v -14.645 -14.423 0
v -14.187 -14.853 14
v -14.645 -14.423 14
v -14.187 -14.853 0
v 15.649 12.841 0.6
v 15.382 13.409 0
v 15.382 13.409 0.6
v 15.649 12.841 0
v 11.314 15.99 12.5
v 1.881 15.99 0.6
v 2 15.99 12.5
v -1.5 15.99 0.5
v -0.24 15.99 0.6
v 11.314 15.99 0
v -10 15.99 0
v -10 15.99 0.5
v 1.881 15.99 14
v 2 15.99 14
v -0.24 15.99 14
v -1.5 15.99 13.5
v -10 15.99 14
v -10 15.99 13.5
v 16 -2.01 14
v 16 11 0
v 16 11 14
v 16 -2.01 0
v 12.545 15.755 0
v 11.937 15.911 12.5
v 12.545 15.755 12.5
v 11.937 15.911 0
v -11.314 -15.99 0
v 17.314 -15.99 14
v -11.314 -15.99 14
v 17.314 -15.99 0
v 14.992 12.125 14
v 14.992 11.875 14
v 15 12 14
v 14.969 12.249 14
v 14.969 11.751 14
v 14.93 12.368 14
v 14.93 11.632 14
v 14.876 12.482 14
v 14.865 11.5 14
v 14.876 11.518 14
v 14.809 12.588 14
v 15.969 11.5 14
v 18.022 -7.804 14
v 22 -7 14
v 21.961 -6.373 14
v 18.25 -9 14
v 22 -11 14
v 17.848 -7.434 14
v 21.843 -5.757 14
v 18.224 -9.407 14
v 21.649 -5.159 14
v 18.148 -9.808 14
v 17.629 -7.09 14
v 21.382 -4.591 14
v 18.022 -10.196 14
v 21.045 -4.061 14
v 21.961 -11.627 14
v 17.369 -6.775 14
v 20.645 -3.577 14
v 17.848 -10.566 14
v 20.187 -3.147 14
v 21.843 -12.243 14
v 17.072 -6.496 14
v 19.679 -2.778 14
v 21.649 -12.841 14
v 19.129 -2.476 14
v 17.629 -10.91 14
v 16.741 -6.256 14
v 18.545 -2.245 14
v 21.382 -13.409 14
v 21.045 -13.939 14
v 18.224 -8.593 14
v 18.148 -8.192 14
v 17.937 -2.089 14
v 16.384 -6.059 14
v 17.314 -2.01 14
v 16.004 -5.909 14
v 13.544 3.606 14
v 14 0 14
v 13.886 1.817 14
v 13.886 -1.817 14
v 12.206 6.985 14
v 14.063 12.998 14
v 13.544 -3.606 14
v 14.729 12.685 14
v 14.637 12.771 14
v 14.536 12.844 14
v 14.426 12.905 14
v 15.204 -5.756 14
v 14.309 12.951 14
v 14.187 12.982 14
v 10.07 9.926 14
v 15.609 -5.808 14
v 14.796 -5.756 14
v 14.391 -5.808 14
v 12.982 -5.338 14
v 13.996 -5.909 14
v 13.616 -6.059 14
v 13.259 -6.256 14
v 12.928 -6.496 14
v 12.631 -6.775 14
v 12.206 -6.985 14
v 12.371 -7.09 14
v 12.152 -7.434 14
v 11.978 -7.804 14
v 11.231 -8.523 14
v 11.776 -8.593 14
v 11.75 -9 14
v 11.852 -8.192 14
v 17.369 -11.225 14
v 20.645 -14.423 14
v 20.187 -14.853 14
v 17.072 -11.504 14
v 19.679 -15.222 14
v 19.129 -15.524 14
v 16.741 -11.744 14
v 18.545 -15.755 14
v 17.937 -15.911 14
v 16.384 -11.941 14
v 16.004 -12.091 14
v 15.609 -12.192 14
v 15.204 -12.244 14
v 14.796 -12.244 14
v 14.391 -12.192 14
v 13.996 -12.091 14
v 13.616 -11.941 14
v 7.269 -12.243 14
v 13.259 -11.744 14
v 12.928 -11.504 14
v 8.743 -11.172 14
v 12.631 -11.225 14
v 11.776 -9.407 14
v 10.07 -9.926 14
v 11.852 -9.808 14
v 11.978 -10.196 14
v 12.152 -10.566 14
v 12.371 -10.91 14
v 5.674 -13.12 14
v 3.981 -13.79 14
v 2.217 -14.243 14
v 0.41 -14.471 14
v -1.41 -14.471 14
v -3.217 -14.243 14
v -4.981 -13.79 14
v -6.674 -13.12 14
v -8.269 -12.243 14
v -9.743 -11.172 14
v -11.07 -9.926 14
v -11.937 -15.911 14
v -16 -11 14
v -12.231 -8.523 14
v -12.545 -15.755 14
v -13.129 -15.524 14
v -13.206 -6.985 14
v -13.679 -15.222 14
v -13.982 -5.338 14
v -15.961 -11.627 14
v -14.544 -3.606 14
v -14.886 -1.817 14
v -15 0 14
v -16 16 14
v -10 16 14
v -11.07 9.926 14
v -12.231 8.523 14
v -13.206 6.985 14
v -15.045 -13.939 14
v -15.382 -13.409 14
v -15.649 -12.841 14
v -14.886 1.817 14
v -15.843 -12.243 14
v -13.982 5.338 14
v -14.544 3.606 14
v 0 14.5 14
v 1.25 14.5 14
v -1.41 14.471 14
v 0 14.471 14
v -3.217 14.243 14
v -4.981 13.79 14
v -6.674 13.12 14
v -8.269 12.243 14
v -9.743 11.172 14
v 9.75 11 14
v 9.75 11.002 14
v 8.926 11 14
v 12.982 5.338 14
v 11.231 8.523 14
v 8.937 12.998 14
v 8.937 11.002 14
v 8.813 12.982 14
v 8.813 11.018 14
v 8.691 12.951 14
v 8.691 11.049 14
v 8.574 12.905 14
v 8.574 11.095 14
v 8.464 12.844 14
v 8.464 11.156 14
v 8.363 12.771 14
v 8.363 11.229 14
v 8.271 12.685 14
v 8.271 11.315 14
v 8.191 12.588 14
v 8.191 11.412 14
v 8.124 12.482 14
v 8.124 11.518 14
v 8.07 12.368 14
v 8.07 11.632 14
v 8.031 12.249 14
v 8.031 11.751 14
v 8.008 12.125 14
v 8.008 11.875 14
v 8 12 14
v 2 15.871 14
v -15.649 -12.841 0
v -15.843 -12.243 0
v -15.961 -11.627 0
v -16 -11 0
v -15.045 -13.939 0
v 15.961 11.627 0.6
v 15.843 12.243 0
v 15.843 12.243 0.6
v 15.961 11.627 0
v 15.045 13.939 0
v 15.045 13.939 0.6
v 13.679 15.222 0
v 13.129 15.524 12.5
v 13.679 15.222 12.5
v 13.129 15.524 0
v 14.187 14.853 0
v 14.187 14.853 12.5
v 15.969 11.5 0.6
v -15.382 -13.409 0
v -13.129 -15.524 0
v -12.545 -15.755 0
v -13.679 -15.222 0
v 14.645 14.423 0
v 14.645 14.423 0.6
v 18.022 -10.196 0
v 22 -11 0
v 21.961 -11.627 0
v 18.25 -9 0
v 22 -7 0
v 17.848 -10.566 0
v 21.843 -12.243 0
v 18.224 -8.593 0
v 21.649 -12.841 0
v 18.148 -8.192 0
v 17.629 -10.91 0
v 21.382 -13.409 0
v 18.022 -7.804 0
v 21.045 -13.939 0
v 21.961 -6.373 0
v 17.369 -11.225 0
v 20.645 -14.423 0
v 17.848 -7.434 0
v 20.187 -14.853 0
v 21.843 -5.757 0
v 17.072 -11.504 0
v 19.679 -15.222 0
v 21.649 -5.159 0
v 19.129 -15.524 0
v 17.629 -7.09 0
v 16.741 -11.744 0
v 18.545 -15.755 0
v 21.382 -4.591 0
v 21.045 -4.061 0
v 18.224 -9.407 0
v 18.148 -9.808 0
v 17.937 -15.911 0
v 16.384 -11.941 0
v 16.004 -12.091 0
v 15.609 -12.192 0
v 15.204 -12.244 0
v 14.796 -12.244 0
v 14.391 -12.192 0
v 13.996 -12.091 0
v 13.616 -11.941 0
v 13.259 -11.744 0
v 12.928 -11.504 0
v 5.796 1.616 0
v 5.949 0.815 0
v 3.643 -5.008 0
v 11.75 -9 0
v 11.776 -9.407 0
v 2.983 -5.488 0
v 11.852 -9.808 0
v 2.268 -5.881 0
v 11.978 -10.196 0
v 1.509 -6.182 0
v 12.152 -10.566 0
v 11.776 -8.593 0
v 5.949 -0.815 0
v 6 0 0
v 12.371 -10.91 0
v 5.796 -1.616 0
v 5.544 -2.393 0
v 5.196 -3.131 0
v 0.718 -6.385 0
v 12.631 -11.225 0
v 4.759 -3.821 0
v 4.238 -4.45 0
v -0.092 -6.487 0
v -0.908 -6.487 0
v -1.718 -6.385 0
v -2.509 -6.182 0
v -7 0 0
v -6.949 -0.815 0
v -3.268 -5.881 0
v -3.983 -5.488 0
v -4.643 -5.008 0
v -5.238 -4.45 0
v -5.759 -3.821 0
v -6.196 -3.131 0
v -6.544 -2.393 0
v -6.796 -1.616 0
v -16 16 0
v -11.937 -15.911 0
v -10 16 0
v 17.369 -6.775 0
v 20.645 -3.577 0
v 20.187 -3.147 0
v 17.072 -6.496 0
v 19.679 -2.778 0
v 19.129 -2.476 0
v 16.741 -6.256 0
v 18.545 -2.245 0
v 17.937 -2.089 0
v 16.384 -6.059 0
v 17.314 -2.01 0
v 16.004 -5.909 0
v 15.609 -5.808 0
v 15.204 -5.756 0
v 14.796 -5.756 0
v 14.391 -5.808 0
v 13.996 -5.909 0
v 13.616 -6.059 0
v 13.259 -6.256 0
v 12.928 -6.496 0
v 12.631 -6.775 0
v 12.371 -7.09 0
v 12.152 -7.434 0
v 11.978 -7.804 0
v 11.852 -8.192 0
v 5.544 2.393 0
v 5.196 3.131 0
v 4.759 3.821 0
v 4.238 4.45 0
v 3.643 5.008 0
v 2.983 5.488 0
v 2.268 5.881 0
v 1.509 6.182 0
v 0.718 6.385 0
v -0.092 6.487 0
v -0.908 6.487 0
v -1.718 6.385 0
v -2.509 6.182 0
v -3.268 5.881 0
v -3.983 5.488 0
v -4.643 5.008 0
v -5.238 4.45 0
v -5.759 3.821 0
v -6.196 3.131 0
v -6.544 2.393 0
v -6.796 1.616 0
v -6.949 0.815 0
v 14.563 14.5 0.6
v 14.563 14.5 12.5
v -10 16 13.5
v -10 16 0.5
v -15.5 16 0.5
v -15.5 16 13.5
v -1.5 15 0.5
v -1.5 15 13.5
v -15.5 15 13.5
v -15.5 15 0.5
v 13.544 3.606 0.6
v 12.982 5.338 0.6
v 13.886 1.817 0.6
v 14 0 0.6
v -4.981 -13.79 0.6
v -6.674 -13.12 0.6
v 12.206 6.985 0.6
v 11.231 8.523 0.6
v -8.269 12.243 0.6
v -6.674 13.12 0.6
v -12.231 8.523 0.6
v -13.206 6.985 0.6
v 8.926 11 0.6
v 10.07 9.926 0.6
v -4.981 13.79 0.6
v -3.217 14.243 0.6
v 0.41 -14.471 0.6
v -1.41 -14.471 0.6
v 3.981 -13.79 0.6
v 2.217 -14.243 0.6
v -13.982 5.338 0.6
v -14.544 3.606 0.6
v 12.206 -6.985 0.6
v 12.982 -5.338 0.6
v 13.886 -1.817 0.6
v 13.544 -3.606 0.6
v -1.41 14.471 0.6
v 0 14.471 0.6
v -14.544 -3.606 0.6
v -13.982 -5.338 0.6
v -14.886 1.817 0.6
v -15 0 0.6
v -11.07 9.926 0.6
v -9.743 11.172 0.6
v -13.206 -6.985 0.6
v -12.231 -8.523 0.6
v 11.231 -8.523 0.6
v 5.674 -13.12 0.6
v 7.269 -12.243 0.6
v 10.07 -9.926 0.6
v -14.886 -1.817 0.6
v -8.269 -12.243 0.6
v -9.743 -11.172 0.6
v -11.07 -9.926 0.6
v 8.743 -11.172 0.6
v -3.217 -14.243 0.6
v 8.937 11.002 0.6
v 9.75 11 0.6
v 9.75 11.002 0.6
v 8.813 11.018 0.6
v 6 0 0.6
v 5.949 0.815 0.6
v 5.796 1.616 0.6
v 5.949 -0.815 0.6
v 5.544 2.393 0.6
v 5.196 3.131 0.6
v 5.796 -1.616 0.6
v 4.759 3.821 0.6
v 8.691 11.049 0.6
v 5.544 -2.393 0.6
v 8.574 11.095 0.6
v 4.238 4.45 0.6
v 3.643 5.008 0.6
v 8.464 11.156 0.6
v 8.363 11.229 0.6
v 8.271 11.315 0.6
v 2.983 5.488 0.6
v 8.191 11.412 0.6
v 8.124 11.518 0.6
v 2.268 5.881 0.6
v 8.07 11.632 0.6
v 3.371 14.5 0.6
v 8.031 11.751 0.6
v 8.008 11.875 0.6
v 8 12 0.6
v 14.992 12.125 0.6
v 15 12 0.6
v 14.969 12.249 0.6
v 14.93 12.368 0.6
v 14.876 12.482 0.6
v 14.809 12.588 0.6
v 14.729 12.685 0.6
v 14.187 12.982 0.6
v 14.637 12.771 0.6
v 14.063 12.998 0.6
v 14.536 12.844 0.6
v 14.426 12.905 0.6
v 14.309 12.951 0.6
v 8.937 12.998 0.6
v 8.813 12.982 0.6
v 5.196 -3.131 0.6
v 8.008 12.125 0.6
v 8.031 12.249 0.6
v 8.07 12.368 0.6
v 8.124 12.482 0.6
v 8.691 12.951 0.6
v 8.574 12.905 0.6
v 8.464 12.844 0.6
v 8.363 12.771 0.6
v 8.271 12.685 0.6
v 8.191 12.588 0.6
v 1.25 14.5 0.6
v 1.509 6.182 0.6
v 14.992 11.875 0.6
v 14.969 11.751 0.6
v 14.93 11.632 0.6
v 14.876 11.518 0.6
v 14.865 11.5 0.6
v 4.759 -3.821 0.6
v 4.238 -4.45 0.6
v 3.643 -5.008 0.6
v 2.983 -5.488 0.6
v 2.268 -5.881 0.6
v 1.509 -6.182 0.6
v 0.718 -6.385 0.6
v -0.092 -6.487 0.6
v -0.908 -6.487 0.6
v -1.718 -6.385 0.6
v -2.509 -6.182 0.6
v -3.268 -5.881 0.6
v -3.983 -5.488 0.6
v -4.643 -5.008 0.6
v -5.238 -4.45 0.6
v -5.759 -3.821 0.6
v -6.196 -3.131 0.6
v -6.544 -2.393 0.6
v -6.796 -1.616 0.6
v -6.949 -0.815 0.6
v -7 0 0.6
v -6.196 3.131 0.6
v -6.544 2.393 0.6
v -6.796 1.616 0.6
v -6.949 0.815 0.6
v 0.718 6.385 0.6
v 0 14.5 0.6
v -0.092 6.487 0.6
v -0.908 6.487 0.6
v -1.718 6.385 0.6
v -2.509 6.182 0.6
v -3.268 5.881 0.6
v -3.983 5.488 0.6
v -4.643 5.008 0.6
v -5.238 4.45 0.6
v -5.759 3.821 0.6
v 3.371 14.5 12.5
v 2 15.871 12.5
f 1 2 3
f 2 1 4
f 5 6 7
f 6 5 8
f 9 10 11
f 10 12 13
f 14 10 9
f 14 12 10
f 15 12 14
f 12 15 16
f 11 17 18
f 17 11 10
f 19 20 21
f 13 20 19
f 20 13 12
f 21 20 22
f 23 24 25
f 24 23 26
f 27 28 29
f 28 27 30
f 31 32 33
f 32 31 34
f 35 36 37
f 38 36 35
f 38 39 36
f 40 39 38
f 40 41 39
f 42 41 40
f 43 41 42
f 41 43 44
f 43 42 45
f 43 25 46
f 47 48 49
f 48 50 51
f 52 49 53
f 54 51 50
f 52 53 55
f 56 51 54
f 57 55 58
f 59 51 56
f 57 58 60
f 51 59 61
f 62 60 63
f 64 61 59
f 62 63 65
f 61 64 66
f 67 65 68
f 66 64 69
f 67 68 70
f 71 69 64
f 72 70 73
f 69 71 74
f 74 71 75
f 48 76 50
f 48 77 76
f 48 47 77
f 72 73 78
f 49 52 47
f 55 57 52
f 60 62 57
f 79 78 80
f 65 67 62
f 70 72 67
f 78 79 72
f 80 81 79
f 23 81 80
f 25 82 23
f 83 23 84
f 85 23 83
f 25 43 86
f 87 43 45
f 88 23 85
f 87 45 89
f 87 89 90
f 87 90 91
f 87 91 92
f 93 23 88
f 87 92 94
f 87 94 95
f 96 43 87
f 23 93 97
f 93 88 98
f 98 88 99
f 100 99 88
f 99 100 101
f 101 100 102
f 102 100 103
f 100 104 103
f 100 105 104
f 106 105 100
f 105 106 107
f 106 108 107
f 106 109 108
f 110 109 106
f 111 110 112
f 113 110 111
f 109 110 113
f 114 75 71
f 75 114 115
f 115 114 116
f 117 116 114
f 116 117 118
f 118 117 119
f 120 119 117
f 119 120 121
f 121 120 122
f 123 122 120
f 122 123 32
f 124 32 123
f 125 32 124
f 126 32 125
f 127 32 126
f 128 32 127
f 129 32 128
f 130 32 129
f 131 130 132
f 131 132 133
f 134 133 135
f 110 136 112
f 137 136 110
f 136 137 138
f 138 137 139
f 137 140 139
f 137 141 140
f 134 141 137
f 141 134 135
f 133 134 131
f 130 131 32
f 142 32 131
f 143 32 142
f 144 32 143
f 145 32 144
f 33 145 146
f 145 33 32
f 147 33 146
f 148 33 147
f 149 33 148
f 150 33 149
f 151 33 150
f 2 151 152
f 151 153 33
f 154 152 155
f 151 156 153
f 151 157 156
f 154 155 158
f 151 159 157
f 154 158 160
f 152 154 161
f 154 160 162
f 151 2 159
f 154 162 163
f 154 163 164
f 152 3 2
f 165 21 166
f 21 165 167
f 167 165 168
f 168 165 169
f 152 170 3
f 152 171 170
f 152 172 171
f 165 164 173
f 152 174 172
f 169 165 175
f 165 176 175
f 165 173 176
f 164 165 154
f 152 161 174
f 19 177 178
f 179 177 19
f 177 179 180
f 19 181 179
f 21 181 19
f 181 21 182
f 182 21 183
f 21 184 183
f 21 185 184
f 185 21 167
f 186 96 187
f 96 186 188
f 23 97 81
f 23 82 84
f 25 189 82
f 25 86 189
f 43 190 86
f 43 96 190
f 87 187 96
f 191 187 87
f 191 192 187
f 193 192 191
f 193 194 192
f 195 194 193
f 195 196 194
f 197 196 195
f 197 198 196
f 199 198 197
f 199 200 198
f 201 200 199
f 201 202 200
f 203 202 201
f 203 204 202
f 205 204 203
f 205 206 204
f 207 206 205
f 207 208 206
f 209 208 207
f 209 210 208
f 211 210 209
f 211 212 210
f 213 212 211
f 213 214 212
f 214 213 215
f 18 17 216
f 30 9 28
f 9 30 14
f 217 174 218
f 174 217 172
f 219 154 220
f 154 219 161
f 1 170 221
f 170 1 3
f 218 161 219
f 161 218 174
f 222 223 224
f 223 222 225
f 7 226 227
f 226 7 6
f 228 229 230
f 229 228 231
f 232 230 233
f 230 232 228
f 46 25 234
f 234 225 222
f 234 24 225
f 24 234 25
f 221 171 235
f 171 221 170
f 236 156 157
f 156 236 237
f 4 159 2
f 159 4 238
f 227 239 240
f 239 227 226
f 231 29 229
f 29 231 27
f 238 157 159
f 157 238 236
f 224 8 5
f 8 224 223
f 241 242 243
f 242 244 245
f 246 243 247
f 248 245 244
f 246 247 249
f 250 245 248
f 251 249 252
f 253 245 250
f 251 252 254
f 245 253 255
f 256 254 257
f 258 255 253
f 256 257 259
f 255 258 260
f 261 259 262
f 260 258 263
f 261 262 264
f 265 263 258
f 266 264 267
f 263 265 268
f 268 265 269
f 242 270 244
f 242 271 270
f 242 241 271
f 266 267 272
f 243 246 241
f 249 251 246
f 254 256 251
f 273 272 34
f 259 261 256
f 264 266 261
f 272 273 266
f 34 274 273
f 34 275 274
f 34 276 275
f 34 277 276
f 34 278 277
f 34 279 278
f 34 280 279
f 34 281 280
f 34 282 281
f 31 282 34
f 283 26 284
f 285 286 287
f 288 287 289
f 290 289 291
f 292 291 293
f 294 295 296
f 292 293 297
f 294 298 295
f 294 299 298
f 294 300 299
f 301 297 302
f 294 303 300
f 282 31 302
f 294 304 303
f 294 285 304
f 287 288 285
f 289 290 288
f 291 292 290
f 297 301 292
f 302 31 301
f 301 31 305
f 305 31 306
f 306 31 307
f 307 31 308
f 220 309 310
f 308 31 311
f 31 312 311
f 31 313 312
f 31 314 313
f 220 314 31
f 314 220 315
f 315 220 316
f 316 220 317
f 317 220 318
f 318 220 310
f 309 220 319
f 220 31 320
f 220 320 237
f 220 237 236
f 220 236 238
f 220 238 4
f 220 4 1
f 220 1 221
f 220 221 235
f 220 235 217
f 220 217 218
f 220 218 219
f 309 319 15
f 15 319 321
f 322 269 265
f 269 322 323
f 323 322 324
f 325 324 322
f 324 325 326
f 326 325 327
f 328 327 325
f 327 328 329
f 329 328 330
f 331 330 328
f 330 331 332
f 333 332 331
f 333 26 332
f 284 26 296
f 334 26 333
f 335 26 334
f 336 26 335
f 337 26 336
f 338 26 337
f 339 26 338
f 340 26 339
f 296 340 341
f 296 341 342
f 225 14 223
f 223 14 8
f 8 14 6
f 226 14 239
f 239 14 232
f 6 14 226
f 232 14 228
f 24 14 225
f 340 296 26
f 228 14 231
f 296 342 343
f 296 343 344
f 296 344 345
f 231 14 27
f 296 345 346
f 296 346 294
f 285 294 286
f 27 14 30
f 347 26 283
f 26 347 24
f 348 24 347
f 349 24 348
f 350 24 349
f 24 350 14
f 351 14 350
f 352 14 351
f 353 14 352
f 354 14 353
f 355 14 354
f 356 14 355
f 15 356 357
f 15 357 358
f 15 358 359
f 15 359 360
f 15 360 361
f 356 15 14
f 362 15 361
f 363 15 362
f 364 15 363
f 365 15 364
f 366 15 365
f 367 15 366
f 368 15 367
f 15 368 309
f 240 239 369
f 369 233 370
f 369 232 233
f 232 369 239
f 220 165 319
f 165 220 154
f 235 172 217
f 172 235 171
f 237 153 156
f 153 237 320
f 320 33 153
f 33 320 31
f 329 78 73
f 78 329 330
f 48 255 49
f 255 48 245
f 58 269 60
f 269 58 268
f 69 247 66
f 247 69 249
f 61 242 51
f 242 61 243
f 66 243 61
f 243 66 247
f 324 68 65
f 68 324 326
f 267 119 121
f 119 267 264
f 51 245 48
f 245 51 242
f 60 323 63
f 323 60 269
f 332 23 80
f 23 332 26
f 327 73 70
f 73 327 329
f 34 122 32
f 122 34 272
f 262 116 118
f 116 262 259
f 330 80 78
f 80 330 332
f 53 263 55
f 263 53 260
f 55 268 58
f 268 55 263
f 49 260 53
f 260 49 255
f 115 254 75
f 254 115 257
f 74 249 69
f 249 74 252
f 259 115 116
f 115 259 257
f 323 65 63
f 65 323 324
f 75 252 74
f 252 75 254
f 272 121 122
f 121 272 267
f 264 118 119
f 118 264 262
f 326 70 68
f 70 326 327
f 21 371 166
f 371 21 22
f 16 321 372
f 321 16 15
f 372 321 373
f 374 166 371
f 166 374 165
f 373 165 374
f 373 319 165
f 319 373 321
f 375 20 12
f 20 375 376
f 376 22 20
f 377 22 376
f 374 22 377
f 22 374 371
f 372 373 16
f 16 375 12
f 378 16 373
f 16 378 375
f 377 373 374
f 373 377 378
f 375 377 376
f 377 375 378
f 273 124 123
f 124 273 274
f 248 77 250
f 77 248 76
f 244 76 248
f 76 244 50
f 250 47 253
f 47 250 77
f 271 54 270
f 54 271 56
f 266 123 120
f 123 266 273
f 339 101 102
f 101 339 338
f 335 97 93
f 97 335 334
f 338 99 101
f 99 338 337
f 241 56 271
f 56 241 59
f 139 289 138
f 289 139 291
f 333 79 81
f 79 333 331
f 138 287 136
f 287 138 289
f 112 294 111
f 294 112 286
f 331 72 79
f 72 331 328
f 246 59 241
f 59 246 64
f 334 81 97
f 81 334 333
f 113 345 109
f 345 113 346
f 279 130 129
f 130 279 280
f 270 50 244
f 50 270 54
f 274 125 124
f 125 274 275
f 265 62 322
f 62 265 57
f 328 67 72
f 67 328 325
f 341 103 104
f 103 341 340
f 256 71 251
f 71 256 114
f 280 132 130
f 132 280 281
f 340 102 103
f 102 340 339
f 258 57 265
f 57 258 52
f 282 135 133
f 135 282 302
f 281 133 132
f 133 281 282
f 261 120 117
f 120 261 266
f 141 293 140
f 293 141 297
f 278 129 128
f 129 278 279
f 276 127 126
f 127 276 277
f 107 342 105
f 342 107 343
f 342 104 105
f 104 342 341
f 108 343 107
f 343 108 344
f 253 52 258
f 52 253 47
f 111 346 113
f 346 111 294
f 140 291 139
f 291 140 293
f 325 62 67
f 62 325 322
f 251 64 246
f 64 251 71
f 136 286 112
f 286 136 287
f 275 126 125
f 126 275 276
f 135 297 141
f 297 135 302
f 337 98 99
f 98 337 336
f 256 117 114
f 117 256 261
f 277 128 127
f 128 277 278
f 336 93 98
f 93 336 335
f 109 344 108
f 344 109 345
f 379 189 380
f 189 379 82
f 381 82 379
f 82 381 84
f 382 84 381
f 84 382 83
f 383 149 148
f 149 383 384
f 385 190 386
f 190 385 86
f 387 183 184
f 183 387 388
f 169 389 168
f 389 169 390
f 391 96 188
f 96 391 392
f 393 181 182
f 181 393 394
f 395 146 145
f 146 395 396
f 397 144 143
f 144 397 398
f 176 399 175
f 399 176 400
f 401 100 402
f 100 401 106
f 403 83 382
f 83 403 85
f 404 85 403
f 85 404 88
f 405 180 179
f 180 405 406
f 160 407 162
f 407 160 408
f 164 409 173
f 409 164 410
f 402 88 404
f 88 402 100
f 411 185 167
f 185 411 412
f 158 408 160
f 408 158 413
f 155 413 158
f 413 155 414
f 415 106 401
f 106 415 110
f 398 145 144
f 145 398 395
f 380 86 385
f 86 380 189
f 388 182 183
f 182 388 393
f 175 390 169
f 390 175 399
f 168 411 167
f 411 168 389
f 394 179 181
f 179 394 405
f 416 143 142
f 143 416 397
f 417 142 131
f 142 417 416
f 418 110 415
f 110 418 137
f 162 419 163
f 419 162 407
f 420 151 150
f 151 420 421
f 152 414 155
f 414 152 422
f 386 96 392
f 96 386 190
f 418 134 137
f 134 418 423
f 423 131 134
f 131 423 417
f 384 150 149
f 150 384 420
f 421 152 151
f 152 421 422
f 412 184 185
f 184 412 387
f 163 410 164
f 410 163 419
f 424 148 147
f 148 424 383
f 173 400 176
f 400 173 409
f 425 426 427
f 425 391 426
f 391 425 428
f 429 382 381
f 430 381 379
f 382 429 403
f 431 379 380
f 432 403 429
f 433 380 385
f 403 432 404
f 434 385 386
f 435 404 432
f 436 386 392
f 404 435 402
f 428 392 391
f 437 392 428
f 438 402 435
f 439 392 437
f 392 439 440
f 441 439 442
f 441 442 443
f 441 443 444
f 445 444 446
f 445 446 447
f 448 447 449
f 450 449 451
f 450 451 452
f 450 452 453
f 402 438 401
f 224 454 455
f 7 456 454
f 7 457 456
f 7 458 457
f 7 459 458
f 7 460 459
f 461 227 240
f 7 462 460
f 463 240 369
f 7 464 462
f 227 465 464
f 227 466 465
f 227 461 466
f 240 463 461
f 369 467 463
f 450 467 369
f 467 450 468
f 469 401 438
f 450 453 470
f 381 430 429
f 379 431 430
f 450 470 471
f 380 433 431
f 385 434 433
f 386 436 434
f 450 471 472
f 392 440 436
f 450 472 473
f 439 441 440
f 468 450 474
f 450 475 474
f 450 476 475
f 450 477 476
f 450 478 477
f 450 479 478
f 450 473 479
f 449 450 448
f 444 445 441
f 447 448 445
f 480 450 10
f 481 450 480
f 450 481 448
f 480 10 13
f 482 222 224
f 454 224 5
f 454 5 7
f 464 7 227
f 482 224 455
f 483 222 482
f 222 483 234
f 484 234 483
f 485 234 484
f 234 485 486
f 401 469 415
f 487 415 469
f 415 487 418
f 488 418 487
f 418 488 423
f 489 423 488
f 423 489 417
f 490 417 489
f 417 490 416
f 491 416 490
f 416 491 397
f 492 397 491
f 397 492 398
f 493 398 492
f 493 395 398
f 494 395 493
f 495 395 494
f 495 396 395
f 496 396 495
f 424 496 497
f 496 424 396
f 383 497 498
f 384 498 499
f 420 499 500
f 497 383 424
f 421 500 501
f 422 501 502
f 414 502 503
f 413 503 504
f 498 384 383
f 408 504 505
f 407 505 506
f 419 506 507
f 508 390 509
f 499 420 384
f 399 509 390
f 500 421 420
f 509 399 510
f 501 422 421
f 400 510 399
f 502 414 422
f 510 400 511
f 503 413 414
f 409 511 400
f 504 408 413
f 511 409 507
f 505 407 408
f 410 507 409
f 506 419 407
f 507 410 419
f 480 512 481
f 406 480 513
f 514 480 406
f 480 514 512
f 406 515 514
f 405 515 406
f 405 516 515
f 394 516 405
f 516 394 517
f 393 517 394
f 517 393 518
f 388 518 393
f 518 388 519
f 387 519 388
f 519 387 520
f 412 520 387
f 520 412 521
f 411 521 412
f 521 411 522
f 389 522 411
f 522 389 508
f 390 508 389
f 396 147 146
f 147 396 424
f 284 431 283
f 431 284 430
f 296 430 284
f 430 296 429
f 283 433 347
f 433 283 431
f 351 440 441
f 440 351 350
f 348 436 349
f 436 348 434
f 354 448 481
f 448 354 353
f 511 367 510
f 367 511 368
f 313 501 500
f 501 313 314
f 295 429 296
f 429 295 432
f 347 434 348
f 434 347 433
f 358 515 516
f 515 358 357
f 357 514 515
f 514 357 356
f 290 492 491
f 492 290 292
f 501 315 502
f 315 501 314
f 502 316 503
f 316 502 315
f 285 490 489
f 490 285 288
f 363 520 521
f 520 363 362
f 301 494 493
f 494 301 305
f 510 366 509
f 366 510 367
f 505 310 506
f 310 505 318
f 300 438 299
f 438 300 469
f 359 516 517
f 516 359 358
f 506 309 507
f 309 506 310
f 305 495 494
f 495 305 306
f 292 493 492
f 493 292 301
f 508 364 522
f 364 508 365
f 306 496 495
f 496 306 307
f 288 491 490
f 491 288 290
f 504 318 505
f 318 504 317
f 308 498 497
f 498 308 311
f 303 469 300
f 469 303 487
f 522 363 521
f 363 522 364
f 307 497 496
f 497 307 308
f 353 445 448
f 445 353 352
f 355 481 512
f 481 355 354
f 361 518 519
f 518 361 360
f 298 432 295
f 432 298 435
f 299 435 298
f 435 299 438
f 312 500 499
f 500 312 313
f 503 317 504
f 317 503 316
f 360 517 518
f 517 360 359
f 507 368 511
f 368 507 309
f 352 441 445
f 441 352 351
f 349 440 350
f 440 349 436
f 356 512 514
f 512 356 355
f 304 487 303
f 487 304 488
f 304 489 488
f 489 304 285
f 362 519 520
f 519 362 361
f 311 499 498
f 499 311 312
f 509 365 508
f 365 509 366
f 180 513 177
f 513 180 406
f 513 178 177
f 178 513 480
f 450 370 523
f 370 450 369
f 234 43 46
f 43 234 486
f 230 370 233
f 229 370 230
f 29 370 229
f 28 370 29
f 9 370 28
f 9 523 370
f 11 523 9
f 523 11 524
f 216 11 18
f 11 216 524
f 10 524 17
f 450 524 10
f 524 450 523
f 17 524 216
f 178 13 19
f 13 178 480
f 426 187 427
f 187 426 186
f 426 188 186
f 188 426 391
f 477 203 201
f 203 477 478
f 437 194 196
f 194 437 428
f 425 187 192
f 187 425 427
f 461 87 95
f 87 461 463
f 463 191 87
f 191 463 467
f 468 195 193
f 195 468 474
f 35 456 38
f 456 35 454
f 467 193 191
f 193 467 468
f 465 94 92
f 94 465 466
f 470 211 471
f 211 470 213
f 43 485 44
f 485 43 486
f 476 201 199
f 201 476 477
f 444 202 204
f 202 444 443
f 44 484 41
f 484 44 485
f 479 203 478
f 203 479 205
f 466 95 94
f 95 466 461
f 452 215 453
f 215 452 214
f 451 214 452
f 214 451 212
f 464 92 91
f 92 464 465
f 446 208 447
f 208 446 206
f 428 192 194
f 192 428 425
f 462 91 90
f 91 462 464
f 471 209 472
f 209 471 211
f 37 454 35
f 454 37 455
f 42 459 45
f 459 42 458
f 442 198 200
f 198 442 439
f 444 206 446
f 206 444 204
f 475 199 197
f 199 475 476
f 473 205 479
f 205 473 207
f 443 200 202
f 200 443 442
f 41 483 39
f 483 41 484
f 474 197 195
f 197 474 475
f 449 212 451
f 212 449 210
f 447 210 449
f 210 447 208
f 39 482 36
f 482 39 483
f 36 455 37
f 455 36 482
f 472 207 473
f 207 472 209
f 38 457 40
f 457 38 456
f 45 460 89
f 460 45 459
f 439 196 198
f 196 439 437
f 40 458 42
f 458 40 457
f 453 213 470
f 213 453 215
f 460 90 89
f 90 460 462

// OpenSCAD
$fn = 50;


union() {
	difference() {
		union() {
			translate(v = [0, 0, 0]) {
				rotate(a = [0, 0, 0]) {
					hull() {
						translate(v = [-11.0000000000, 11.0000000000, 0]) {
							rotate(a = [0, 0, 0]) {
								translate(v = [0, 0, 0]) {
									rotate(a = [0, 0, 0]) {
										cylinder(h = 14, r = 5);
									}
								}
							}
						}
						translate(v = [11.0000000000, 11.0000000000, 0]) {
							rotate(a = [0, 0, 0]) {
								translate(v = [0, 0, 0]) {
									rotate(a = [0, 0, 0]) {
										cylinder(h = 14, r = 5);
									}
								}
							}
						}
						translate(v = [-11.0000000000, -11.0000000000, 0]) {
							rotate(a = [0, 0, 0]) {
								translate(v = [0, 0, 0]) {
									rotate(a = [0, 0, 0]) {
										cylinder(h = 14, r = 5);
									}
								}
							}
						}
						translate(v = [11.0000000000, -11.0000000000, 0]) {
							rotate(a = [0, 0, 0]) {
								translate(v = [0, 0, 0]) {
									rotate(a = [0, 0, 0]) {
										cylinder(h = 14, r = 5);
									}
								}
							}
						}
					}
				}
			}
			translate(v = [7.5000000000, -9.0000000000, 0]) {
				rotate(a = [0, 0, 0]) {
					hull() {
						translate(v = [-9.5000000000, 2.0000000000, 0]) {
							rotate(a = [0, 0, 0]) {
								translate(v = [0, 0, 0]) {
									rotate(a = [0, 0, 0]) {
										cylinder(h = 14, r = 5);
									}
								}
							}
						}
						translate(v = [9.5000000000, 2.0000000000, 0]) {
							rotate(a = [0, 0, 0]) {
								translate(v = [0, 0, 0]) {
									rotate(a = [0, 0, 0]) {
										cylinder(h = 14, r = 5);
									}
								}
							}
						}
						translate(v = [-9.5000000000, -2.0000000000, 0]) {
							rotate(a = [0, 0, 0]) {
								translate(v = [0, 0, 0]) {
									rotate(a = [0, 0, 0]) {
										cylinder(h = 14, r = 5);
									}
								}
							}
						}
						translate(v = [9.5000000000, -2.0000000000, 0]) {
							rotate(a = [0, 0, 0]) {
								translate(v = [0, 0, 0]) {
									rotate(a = [0, 0, 0]) {
										cylinder(h = 14, r = 5);
									}
								}
							}
						}
					}
				}
			}
			translate(v = [-16.0000000000, 10.0000000000, 0]) {
				rotate(a = [0, 0, 0]) {
					cube(size = [6, 6, 14]);
				}
			}
		}
		union() {
			translate(v = [-15.5000000000, 15.0000000000, 0.5000000000]) {
				rotate(a = [0, 0, 0]) {
					cube(size = [14, 1, 13.0000000000]);
				}
			}
			translate(v = [15.0000000000, -9.0000000000, -125.0000000000]) {
				rotate(a = [0, 0, 0]) {
					cylinder(h = 250, r = 3.2500000000);
				}
			}
			translate(v = [-0.5000000000, 0.0000000000, 0.6000000000]) {
				rotate(a = [0, 0, 0]) {
					cylinder(h = 16.4000000000, r = 14.5000000000);
				}
			}
			translate(v = [-0.5000000000, 0.0000000000, -7.0000000000]) {
				rotate(a = [0, 0, 0]) {
					cylinder(h = 14, r = 6.5000000000);
				}
			}
			translate(v = [0.0000000000, 11.5000000000, 0.6000000000]) {
				rotate(a = [0, 0, 0]) {
					cube(size = [16.0000000000, 3, 16.4000000000]);
				}
			}
			translate(v = [2.0000000000, 11.5000000000, 12.5000000000]) {
				rotate(a = [0, 0, 0]) {
					cube(size = [14.0000000000, 6, 1.5000000000]);
				}
			}
			translate(v = [-3.0000000000, 18.7500000000, 0.6000000000]) {
				rotate(a = [0, 0, -45]) {
					cube(size = [10, 1.5000000000, 16.4000000000]);
				}
			}
			translate(v = [2.2500000000, 11.0000000000, 0.6000000000]) {
				rotate(a = [0, 0, 0]) {
					cube(size = [7.5000000000, 2, 13.4000000000]);
				}
			}
		}
	}
	union() {
		translate(v = [11.5000000000, 12, 0]) {
			rotate(a = [0, 0, 0]) {
				hull() {
					translate(v = [2.5000000000, 0, 0]) {
						rotate(a = [0, 0, 0]) {
							translate(v = [0, 0, 0]) {
								rotate(a = [0, 0, 0]) {
									cylinder(h = 14, r = 1.0000000000);
								}
							}
						}
					}
					translate(v = [-2.5000000000, 0, 0]) {
						rotate(a = [0, 0, 0]) {
							translate(v = [0, 0, 0]) {
								rotate(a = [0, 0, 0]) {
									cylinder(h = 14, r = 1.0000000000);
								}
							}
						}
					}
				}
			}
		}
	}
}
